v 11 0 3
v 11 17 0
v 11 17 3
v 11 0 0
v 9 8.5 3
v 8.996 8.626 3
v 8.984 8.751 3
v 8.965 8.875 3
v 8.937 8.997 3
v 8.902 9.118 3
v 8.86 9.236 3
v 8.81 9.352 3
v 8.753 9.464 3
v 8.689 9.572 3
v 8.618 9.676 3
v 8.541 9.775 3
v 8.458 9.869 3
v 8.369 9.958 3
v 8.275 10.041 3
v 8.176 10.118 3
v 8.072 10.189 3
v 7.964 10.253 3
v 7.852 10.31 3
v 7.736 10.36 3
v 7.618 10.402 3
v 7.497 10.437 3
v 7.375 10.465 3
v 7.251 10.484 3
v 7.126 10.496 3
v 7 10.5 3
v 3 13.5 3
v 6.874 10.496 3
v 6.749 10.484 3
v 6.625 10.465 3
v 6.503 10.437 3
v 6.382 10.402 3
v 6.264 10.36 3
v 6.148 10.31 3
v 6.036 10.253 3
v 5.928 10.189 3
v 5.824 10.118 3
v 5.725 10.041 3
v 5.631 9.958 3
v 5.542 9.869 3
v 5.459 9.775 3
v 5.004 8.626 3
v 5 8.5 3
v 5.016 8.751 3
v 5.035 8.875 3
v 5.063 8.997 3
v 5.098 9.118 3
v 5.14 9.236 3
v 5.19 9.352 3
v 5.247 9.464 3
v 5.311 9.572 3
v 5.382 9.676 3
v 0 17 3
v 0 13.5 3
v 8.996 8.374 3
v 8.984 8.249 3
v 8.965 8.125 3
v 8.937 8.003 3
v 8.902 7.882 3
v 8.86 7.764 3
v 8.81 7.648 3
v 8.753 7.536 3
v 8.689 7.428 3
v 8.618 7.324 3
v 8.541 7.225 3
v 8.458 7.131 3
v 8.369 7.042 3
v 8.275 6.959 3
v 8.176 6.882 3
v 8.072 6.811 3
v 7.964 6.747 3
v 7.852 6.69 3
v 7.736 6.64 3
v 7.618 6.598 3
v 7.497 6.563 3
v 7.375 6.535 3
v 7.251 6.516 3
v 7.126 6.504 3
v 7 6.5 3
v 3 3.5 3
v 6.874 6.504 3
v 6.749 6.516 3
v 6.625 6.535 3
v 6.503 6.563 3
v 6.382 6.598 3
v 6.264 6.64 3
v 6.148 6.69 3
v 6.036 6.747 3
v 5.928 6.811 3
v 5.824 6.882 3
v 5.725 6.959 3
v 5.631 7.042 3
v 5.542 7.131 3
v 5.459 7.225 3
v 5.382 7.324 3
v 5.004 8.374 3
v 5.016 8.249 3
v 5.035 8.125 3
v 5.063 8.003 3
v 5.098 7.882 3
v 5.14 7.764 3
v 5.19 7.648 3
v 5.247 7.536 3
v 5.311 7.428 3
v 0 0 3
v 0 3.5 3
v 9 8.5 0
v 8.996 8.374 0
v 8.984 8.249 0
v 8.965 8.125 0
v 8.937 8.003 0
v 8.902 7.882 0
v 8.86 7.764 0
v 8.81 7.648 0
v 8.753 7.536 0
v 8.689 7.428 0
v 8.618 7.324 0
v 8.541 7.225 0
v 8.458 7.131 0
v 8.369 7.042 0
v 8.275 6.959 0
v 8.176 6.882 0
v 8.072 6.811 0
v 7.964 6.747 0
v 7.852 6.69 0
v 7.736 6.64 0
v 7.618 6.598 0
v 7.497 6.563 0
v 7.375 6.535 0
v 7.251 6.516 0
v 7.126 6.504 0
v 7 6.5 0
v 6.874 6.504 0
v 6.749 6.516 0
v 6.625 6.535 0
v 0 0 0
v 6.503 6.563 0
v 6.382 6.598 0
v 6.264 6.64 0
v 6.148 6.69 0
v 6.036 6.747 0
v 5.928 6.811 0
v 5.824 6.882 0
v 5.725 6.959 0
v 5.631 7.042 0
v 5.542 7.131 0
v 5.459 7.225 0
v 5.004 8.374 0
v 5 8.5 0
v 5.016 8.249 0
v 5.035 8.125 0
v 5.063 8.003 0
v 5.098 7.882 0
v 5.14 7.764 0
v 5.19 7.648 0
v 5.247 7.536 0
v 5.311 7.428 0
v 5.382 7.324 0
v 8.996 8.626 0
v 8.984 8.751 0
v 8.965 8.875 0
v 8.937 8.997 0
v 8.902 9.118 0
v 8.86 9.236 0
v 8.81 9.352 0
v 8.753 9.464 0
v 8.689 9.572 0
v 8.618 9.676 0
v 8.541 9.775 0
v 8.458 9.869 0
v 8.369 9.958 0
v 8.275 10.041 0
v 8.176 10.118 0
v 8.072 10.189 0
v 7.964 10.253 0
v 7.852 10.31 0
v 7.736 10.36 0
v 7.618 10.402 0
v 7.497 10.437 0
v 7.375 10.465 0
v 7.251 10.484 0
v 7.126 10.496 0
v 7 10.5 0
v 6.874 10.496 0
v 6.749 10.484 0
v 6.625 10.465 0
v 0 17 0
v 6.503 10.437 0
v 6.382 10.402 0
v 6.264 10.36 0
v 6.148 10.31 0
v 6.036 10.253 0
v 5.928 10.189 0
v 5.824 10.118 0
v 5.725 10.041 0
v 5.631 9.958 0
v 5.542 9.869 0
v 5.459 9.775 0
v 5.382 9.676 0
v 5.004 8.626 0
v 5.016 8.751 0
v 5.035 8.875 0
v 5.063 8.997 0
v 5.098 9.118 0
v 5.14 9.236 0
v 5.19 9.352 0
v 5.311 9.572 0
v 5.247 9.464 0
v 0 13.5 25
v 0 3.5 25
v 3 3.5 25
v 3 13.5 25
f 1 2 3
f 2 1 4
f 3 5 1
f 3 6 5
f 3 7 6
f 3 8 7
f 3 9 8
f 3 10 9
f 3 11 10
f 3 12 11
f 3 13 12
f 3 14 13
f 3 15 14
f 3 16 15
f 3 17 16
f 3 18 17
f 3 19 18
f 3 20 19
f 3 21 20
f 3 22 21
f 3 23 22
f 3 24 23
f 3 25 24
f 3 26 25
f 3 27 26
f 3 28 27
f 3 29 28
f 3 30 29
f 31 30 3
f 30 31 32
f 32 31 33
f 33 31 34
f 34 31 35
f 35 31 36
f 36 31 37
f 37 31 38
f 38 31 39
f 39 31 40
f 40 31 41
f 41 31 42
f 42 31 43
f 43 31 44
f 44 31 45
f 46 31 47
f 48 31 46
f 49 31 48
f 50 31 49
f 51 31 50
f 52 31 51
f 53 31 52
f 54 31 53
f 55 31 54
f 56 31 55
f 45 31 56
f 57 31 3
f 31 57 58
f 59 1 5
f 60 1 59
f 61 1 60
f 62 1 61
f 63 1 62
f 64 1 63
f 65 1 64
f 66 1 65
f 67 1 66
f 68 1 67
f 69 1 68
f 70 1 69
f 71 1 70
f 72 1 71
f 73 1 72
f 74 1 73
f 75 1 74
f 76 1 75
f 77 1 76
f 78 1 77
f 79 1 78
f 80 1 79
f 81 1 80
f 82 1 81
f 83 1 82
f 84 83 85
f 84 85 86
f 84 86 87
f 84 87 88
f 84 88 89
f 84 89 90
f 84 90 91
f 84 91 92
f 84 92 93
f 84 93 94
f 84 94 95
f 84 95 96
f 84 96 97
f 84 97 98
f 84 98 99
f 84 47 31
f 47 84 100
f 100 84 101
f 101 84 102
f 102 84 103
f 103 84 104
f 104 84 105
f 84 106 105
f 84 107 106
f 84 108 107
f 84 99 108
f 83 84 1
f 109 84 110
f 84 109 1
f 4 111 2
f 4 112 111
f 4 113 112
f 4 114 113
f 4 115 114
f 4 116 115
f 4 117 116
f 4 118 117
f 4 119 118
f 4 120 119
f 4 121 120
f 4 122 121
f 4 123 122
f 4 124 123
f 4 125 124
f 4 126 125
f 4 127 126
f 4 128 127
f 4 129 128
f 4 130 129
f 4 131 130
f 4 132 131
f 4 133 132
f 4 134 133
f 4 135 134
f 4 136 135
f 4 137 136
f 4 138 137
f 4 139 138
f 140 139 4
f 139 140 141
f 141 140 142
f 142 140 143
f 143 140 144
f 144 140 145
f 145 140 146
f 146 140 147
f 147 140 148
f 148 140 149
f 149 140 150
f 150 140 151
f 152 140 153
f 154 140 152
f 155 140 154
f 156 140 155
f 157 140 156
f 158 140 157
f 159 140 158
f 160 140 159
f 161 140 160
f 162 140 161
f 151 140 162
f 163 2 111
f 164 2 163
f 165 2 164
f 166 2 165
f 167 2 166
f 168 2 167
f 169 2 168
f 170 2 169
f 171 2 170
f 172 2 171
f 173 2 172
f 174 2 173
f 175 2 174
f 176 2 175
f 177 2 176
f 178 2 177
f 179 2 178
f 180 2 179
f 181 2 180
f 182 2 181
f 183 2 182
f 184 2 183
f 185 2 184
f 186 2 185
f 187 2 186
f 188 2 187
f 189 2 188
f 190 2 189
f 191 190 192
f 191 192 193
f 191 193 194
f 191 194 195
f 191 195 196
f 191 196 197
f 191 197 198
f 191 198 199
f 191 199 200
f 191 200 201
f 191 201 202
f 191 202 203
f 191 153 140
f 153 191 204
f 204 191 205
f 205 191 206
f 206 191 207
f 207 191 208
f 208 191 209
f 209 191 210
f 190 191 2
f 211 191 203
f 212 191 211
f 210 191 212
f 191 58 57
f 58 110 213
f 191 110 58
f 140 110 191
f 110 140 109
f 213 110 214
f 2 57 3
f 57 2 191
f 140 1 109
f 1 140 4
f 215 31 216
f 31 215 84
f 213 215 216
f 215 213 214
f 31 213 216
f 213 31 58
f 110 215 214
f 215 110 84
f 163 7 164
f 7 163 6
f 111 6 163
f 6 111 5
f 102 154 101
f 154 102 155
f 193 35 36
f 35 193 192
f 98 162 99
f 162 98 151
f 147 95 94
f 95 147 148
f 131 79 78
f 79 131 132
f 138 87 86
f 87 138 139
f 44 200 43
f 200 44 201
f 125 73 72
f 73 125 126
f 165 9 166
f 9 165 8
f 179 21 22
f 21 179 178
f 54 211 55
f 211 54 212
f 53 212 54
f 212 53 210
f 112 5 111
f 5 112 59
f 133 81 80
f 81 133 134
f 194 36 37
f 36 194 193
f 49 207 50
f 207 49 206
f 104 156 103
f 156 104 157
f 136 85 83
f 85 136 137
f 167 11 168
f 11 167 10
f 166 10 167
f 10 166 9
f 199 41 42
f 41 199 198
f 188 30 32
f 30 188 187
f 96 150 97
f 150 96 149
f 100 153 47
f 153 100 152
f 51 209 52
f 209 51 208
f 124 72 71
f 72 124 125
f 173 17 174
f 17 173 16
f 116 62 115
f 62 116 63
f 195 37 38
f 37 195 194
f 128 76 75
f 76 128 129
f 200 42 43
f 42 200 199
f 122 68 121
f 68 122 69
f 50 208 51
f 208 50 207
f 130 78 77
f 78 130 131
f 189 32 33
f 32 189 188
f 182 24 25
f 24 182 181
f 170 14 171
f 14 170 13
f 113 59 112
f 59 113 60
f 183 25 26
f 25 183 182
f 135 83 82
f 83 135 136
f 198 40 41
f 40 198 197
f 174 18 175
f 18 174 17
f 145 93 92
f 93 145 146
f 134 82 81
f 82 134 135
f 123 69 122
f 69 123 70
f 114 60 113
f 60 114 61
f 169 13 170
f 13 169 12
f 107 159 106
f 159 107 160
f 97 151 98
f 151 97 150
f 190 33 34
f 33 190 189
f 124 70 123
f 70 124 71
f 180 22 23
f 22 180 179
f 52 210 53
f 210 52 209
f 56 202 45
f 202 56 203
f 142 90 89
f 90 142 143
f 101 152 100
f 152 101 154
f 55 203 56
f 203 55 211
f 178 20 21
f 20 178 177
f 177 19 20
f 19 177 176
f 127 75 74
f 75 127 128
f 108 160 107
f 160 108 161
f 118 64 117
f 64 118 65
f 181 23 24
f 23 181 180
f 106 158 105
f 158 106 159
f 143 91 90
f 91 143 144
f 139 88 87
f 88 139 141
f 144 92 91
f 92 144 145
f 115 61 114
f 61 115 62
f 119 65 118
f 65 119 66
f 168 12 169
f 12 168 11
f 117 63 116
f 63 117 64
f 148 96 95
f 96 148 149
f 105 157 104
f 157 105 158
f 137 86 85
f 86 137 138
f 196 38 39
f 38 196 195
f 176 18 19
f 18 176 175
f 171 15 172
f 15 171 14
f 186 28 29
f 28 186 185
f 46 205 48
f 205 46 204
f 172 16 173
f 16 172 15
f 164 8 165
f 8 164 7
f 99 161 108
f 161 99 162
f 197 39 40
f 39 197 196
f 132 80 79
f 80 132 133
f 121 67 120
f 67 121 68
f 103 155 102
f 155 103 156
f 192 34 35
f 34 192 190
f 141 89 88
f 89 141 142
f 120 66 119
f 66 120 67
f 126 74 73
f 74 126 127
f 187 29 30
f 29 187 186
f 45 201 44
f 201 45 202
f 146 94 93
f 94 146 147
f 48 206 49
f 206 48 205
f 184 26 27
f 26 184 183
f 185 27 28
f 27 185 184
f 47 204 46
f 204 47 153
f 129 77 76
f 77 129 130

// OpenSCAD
$fn=100;
difference() {
  union() {
    cube([11, 17, 3]);
    translate([0, 3.5, 0])
    cube([3, 10, 25]);
  }
  translate([7, 8.5, -1]) {
    cylinder(d=4, h=7);
  }
}
